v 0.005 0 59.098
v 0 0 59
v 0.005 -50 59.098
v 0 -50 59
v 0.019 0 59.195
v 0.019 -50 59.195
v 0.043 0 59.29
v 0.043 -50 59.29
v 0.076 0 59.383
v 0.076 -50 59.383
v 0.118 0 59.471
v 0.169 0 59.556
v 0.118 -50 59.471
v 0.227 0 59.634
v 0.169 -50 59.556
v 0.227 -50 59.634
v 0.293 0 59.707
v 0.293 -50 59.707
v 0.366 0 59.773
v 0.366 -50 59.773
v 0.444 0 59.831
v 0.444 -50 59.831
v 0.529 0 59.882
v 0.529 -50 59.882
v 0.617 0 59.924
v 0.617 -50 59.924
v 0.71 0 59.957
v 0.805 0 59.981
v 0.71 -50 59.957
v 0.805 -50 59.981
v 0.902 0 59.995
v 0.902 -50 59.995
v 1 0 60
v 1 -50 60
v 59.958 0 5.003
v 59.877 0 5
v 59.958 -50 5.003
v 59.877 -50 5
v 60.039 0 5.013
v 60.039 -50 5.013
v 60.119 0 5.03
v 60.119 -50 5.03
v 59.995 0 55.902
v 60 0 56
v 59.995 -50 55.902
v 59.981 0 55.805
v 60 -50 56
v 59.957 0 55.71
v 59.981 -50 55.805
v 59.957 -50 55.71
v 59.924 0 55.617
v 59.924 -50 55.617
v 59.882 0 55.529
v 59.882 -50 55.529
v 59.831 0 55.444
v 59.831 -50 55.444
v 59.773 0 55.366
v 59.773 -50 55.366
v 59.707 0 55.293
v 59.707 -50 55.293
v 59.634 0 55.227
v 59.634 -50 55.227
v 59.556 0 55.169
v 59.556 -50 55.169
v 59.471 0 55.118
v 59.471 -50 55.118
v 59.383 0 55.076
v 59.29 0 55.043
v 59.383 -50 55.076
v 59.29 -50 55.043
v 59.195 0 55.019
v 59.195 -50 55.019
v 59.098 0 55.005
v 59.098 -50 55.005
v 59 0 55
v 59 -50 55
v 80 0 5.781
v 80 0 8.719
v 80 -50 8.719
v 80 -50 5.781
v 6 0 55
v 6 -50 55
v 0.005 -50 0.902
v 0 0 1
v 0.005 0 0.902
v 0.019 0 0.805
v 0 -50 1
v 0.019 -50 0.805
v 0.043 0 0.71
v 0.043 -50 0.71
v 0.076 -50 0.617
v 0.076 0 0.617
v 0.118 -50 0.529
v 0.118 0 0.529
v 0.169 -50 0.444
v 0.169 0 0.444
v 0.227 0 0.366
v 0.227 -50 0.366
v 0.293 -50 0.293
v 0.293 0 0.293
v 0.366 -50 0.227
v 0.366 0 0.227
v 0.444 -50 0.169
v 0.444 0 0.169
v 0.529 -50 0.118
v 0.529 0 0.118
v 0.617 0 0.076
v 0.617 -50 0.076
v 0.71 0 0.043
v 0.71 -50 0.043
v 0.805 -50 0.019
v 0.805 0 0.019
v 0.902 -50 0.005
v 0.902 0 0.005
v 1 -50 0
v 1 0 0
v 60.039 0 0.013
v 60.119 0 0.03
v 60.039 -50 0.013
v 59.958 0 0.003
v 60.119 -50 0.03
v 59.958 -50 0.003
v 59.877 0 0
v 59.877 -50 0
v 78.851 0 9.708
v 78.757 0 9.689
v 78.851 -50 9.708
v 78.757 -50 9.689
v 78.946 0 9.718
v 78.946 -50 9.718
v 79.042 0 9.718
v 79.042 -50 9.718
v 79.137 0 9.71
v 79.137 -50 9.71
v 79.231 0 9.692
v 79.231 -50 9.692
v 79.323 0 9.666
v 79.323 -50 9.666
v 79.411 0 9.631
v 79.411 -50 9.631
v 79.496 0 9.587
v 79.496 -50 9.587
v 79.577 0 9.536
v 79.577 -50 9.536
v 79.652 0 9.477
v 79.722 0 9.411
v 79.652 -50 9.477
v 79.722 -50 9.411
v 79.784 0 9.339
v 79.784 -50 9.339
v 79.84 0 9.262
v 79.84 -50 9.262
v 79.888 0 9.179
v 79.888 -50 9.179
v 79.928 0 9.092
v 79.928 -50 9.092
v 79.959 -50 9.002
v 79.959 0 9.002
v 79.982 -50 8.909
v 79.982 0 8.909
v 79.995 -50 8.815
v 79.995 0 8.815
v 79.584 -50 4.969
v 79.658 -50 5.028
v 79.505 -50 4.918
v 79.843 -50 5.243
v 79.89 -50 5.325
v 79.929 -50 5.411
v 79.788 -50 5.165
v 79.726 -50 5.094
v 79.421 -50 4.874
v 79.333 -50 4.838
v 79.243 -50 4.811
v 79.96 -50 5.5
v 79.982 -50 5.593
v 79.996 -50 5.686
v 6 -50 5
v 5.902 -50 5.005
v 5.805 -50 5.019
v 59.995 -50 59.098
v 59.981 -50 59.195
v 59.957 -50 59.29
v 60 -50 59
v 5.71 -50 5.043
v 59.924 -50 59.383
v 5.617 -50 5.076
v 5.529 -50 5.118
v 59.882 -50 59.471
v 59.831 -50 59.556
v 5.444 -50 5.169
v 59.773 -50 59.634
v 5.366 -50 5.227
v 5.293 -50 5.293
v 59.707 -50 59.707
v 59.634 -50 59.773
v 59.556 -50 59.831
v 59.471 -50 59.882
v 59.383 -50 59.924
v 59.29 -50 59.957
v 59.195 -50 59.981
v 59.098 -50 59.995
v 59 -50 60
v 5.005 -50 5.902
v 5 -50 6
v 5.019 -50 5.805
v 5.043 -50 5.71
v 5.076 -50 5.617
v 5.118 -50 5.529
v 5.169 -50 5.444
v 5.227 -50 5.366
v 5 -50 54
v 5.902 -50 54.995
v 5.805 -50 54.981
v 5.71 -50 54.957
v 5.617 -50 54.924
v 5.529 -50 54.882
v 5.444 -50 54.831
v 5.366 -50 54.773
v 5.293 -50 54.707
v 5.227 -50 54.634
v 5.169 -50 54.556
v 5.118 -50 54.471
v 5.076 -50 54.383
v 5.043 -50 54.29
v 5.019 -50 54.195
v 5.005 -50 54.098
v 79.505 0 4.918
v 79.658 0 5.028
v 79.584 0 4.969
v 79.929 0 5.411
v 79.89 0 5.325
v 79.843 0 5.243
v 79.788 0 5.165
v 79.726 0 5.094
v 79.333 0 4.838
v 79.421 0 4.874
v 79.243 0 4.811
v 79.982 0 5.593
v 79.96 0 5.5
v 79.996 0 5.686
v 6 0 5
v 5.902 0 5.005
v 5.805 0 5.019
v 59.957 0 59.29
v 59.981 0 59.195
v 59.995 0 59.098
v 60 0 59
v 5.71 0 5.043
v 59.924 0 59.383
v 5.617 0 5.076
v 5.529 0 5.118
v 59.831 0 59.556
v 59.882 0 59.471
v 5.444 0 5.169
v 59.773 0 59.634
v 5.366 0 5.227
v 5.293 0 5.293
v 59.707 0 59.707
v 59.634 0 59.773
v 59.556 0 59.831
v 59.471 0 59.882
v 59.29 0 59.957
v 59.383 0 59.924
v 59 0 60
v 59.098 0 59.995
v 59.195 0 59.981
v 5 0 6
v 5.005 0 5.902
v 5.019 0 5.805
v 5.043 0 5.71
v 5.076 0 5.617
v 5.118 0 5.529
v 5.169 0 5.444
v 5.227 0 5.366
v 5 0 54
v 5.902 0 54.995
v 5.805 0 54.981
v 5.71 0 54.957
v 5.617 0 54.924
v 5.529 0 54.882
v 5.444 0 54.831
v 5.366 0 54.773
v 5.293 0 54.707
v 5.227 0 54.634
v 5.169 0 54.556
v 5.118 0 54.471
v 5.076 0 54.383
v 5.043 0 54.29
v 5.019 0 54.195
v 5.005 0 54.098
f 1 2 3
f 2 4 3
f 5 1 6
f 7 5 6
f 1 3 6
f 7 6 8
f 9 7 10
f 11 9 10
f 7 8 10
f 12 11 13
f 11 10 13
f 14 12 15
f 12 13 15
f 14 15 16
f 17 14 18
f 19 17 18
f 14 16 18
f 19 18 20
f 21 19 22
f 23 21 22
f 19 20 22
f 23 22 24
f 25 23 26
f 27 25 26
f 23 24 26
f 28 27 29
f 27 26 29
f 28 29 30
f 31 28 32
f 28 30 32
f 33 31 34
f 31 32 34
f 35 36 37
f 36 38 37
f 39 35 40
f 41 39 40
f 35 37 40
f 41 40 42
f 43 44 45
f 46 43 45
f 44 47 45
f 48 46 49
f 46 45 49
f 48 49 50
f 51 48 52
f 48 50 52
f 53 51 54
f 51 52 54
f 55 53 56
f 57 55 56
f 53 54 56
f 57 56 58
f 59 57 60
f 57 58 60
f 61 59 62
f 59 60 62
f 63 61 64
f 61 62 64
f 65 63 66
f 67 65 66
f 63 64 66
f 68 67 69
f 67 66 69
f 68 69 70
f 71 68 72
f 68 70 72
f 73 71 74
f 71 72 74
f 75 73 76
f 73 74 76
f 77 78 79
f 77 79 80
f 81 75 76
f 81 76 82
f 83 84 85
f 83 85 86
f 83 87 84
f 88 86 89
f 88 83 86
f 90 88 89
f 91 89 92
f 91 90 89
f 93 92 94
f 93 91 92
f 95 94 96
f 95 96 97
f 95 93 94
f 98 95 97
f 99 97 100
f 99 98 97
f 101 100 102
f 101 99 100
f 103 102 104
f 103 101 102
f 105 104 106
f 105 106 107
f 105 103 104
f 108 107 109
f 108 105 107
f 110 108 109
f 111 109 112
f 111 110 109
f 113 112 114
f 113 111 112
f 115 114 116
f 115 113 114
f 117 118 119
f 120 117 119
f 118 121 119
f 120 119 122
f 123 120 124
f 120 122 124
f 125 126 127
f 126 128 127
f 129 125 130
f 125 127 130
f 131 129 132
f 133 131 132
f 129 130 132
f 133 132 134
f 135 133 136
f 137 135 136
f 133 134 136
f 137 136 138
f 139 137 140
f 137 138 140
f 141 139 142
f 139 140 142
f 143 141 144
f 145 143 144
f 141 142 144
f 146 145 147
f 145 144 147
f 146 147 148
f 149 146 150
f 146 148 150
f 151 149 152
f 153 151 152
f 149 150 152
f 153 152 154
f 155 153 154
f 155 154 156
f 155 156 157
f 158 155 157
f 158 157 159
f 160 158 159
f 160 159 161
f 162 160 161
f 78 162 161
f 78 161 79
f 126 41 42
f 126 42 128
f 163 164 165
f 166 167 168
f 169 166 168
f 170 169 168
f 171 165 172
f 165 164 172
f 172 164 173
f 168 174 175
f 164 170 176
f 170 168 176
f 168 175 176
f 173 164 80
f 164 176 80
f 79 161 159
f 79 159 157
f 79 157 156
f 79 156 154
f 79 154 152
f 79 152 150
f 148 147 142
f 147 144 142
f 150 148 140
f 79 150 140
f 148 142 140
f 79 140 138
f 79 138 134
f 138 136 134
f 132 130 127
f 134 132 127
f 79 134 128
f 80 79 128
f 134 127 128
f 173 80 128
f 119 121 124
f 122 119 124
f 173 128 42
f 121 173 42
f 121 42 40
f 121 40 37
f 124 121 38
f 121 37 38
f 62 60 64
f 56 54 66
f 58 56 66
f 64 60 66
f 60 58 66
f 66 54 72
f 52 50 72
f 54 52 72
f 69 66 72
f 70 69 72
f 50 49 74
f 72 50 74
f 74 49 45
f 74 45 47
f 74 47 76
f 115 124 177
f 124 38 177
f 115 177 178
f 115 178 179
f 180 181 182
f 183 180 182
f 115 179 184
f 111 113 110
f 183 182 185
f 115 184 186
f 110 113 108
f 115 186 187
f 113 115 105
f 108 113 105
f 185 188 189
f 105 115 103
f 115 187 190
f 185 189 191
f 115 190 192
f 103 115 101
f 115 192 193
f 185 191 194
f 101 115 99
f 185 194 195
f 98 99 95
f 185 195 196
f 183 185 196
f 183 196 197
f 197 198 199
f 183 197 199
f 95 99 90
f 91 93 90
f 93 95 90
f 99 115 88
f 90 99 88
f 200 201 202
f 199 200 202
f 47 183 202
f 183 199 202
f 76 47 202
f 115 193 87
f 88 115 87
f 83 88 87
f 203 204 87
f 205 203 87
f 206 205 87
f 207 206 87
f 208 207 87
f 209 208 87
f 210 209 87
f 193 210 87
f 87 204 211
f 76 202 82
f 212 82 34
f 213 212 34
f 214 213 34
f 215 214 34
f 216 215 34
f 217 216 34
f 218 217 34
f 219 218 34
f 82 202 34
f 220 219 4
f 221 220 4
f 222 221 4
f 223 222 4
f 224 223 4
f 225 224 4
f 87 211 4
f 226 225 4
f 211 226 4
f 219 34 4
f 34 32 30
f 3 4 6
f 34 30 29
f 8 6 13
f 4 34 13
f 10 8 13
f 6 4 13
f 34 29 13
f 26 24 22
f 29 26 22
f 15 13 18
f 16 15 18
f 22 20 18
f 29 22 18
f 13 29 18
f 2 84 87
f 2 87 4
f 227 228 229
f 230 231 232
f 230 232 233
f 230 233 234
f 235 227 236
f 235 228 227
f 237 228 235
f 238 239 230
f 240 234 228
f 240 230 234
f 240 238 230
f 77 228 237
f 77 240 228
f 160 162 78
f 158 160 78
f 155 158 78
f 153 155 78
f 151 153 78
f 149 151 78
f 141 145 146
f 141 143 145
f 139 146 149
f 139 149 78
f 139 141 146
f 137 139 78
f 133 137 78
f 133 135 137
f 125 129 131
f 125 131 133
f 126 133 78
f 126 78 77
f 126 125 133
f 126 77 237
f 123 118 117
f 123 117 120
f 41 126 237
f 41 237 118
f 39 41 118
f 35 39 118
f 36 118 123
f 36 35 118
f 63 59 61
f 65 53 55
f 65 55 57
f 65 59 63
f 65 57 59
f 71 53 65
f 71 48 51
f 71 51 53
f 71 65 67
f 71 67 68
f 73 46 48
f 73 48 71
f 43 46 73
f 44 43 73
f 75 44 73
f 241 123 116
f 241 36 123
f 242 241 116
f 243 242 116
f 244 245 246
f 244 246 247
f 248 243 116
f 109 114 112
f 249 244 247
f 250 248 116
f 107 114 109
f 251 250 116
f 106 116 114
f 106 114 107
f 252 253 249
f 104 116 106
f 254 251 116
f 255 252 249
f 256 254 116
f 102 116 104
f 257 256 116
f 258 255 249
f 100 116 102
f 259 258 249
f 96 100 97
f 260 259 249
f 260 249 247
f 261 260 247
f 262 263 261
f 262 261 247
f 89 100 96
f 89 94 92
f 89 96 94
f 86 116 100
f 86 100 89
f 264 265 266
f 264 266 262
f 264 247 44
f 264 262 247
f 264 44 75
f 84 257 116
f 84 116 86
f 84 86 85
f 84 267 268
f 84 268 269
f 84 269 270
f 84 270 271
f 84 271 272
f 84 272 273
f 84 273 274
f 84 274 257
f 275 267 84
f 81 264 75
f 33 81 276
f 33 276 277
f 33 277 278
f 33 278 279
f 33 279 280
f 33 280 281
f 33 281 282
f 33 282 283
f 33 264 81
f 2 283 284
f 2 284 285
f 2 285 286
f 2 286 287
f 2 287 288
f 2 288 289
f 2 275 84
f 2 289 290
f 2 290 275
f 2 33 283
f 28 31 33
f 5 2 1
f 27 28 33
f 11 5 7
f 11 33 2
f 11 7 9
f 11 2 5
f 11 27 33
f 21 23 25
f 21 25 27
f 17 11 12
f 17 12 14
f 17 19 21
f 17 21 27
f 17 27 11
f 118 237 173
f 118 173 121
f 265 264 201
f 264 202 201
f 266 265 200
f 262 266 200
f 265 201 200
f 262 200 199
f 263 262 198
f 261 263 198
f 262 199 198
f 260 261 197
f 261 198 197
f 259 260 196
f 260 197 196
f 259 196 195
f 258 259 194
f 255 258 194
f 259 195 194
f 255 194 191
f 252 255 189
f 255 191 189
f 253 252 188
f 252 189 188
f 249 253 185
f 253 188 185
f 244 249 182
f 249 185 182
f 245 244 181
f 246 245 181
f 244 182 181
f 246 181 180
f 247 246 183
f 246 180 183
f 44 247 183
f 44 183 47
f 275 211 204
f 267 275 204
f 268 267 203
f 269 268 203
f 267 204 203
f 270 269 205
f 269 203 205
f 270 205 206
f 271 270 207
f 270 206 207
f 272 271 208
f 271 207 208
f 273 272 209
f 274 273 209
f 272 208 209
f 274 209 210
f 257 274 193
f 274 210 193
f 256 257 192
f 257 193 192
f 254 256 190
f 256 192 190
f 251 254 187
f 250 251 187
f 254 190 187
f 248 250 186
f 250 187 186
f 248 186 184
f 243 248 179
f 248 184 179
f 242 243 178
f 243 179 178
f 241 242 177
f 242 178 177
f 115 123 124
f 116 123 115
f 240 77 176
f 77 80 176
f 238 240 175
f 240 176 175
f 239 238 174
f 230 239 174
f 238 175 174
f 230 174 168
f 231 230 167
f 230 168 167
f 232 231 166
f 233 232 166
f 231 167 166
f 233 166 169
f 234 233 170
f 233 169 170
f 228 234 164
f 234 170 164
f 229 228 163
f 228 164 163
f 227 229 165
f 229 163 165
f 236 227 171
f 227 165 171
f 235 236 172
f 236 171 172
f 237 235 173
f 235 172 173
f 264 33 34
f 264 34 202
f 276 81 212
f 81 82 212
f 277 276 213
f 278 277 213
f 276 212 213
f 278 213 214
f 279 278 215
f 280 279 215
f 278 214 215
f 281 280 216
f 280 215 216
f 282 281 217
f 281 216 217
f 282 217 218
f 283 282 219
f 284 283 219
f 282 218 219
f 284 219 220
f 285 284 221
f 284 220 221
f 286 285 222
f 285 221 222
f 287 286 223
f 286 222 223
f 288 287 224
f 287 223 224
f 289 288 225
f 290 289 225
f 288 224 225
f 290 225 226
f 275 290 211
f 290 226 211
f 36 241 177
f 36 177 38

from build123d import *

# Parameters (mm, degrees)
PAD_DEPTH = 50
FILLET_R  = 1


with BuildPart() as part:
    # Sketch → Pad (new body)
    with BuildSketch(Plane.XZ):
        Polygon((0, 0), (0, 60), (60, 60), (60, 55), (5, 55), (5, 5), (60, 5), (80, 10), (80, 5), (60, 0), align=None)
    extrude(amount=PAD_DEPTH)

    # Fillet
    fillet_edges = [part.edges().sort_by_distance(p)[0] for p in [
        (0, -25, 0),
        (60, -25, 0),
        (80, -25, 5),
        (80, -25, 10),
        (60, -25, 55),
        (60, -25, 60),
        (0, -25, 60),
        (60, -25, 5),
        (5, -25, 5),
        (5, -25, 55),
    ]]
    fillet(fillet_edges, radius=FILLET_R)


solid = part.part
